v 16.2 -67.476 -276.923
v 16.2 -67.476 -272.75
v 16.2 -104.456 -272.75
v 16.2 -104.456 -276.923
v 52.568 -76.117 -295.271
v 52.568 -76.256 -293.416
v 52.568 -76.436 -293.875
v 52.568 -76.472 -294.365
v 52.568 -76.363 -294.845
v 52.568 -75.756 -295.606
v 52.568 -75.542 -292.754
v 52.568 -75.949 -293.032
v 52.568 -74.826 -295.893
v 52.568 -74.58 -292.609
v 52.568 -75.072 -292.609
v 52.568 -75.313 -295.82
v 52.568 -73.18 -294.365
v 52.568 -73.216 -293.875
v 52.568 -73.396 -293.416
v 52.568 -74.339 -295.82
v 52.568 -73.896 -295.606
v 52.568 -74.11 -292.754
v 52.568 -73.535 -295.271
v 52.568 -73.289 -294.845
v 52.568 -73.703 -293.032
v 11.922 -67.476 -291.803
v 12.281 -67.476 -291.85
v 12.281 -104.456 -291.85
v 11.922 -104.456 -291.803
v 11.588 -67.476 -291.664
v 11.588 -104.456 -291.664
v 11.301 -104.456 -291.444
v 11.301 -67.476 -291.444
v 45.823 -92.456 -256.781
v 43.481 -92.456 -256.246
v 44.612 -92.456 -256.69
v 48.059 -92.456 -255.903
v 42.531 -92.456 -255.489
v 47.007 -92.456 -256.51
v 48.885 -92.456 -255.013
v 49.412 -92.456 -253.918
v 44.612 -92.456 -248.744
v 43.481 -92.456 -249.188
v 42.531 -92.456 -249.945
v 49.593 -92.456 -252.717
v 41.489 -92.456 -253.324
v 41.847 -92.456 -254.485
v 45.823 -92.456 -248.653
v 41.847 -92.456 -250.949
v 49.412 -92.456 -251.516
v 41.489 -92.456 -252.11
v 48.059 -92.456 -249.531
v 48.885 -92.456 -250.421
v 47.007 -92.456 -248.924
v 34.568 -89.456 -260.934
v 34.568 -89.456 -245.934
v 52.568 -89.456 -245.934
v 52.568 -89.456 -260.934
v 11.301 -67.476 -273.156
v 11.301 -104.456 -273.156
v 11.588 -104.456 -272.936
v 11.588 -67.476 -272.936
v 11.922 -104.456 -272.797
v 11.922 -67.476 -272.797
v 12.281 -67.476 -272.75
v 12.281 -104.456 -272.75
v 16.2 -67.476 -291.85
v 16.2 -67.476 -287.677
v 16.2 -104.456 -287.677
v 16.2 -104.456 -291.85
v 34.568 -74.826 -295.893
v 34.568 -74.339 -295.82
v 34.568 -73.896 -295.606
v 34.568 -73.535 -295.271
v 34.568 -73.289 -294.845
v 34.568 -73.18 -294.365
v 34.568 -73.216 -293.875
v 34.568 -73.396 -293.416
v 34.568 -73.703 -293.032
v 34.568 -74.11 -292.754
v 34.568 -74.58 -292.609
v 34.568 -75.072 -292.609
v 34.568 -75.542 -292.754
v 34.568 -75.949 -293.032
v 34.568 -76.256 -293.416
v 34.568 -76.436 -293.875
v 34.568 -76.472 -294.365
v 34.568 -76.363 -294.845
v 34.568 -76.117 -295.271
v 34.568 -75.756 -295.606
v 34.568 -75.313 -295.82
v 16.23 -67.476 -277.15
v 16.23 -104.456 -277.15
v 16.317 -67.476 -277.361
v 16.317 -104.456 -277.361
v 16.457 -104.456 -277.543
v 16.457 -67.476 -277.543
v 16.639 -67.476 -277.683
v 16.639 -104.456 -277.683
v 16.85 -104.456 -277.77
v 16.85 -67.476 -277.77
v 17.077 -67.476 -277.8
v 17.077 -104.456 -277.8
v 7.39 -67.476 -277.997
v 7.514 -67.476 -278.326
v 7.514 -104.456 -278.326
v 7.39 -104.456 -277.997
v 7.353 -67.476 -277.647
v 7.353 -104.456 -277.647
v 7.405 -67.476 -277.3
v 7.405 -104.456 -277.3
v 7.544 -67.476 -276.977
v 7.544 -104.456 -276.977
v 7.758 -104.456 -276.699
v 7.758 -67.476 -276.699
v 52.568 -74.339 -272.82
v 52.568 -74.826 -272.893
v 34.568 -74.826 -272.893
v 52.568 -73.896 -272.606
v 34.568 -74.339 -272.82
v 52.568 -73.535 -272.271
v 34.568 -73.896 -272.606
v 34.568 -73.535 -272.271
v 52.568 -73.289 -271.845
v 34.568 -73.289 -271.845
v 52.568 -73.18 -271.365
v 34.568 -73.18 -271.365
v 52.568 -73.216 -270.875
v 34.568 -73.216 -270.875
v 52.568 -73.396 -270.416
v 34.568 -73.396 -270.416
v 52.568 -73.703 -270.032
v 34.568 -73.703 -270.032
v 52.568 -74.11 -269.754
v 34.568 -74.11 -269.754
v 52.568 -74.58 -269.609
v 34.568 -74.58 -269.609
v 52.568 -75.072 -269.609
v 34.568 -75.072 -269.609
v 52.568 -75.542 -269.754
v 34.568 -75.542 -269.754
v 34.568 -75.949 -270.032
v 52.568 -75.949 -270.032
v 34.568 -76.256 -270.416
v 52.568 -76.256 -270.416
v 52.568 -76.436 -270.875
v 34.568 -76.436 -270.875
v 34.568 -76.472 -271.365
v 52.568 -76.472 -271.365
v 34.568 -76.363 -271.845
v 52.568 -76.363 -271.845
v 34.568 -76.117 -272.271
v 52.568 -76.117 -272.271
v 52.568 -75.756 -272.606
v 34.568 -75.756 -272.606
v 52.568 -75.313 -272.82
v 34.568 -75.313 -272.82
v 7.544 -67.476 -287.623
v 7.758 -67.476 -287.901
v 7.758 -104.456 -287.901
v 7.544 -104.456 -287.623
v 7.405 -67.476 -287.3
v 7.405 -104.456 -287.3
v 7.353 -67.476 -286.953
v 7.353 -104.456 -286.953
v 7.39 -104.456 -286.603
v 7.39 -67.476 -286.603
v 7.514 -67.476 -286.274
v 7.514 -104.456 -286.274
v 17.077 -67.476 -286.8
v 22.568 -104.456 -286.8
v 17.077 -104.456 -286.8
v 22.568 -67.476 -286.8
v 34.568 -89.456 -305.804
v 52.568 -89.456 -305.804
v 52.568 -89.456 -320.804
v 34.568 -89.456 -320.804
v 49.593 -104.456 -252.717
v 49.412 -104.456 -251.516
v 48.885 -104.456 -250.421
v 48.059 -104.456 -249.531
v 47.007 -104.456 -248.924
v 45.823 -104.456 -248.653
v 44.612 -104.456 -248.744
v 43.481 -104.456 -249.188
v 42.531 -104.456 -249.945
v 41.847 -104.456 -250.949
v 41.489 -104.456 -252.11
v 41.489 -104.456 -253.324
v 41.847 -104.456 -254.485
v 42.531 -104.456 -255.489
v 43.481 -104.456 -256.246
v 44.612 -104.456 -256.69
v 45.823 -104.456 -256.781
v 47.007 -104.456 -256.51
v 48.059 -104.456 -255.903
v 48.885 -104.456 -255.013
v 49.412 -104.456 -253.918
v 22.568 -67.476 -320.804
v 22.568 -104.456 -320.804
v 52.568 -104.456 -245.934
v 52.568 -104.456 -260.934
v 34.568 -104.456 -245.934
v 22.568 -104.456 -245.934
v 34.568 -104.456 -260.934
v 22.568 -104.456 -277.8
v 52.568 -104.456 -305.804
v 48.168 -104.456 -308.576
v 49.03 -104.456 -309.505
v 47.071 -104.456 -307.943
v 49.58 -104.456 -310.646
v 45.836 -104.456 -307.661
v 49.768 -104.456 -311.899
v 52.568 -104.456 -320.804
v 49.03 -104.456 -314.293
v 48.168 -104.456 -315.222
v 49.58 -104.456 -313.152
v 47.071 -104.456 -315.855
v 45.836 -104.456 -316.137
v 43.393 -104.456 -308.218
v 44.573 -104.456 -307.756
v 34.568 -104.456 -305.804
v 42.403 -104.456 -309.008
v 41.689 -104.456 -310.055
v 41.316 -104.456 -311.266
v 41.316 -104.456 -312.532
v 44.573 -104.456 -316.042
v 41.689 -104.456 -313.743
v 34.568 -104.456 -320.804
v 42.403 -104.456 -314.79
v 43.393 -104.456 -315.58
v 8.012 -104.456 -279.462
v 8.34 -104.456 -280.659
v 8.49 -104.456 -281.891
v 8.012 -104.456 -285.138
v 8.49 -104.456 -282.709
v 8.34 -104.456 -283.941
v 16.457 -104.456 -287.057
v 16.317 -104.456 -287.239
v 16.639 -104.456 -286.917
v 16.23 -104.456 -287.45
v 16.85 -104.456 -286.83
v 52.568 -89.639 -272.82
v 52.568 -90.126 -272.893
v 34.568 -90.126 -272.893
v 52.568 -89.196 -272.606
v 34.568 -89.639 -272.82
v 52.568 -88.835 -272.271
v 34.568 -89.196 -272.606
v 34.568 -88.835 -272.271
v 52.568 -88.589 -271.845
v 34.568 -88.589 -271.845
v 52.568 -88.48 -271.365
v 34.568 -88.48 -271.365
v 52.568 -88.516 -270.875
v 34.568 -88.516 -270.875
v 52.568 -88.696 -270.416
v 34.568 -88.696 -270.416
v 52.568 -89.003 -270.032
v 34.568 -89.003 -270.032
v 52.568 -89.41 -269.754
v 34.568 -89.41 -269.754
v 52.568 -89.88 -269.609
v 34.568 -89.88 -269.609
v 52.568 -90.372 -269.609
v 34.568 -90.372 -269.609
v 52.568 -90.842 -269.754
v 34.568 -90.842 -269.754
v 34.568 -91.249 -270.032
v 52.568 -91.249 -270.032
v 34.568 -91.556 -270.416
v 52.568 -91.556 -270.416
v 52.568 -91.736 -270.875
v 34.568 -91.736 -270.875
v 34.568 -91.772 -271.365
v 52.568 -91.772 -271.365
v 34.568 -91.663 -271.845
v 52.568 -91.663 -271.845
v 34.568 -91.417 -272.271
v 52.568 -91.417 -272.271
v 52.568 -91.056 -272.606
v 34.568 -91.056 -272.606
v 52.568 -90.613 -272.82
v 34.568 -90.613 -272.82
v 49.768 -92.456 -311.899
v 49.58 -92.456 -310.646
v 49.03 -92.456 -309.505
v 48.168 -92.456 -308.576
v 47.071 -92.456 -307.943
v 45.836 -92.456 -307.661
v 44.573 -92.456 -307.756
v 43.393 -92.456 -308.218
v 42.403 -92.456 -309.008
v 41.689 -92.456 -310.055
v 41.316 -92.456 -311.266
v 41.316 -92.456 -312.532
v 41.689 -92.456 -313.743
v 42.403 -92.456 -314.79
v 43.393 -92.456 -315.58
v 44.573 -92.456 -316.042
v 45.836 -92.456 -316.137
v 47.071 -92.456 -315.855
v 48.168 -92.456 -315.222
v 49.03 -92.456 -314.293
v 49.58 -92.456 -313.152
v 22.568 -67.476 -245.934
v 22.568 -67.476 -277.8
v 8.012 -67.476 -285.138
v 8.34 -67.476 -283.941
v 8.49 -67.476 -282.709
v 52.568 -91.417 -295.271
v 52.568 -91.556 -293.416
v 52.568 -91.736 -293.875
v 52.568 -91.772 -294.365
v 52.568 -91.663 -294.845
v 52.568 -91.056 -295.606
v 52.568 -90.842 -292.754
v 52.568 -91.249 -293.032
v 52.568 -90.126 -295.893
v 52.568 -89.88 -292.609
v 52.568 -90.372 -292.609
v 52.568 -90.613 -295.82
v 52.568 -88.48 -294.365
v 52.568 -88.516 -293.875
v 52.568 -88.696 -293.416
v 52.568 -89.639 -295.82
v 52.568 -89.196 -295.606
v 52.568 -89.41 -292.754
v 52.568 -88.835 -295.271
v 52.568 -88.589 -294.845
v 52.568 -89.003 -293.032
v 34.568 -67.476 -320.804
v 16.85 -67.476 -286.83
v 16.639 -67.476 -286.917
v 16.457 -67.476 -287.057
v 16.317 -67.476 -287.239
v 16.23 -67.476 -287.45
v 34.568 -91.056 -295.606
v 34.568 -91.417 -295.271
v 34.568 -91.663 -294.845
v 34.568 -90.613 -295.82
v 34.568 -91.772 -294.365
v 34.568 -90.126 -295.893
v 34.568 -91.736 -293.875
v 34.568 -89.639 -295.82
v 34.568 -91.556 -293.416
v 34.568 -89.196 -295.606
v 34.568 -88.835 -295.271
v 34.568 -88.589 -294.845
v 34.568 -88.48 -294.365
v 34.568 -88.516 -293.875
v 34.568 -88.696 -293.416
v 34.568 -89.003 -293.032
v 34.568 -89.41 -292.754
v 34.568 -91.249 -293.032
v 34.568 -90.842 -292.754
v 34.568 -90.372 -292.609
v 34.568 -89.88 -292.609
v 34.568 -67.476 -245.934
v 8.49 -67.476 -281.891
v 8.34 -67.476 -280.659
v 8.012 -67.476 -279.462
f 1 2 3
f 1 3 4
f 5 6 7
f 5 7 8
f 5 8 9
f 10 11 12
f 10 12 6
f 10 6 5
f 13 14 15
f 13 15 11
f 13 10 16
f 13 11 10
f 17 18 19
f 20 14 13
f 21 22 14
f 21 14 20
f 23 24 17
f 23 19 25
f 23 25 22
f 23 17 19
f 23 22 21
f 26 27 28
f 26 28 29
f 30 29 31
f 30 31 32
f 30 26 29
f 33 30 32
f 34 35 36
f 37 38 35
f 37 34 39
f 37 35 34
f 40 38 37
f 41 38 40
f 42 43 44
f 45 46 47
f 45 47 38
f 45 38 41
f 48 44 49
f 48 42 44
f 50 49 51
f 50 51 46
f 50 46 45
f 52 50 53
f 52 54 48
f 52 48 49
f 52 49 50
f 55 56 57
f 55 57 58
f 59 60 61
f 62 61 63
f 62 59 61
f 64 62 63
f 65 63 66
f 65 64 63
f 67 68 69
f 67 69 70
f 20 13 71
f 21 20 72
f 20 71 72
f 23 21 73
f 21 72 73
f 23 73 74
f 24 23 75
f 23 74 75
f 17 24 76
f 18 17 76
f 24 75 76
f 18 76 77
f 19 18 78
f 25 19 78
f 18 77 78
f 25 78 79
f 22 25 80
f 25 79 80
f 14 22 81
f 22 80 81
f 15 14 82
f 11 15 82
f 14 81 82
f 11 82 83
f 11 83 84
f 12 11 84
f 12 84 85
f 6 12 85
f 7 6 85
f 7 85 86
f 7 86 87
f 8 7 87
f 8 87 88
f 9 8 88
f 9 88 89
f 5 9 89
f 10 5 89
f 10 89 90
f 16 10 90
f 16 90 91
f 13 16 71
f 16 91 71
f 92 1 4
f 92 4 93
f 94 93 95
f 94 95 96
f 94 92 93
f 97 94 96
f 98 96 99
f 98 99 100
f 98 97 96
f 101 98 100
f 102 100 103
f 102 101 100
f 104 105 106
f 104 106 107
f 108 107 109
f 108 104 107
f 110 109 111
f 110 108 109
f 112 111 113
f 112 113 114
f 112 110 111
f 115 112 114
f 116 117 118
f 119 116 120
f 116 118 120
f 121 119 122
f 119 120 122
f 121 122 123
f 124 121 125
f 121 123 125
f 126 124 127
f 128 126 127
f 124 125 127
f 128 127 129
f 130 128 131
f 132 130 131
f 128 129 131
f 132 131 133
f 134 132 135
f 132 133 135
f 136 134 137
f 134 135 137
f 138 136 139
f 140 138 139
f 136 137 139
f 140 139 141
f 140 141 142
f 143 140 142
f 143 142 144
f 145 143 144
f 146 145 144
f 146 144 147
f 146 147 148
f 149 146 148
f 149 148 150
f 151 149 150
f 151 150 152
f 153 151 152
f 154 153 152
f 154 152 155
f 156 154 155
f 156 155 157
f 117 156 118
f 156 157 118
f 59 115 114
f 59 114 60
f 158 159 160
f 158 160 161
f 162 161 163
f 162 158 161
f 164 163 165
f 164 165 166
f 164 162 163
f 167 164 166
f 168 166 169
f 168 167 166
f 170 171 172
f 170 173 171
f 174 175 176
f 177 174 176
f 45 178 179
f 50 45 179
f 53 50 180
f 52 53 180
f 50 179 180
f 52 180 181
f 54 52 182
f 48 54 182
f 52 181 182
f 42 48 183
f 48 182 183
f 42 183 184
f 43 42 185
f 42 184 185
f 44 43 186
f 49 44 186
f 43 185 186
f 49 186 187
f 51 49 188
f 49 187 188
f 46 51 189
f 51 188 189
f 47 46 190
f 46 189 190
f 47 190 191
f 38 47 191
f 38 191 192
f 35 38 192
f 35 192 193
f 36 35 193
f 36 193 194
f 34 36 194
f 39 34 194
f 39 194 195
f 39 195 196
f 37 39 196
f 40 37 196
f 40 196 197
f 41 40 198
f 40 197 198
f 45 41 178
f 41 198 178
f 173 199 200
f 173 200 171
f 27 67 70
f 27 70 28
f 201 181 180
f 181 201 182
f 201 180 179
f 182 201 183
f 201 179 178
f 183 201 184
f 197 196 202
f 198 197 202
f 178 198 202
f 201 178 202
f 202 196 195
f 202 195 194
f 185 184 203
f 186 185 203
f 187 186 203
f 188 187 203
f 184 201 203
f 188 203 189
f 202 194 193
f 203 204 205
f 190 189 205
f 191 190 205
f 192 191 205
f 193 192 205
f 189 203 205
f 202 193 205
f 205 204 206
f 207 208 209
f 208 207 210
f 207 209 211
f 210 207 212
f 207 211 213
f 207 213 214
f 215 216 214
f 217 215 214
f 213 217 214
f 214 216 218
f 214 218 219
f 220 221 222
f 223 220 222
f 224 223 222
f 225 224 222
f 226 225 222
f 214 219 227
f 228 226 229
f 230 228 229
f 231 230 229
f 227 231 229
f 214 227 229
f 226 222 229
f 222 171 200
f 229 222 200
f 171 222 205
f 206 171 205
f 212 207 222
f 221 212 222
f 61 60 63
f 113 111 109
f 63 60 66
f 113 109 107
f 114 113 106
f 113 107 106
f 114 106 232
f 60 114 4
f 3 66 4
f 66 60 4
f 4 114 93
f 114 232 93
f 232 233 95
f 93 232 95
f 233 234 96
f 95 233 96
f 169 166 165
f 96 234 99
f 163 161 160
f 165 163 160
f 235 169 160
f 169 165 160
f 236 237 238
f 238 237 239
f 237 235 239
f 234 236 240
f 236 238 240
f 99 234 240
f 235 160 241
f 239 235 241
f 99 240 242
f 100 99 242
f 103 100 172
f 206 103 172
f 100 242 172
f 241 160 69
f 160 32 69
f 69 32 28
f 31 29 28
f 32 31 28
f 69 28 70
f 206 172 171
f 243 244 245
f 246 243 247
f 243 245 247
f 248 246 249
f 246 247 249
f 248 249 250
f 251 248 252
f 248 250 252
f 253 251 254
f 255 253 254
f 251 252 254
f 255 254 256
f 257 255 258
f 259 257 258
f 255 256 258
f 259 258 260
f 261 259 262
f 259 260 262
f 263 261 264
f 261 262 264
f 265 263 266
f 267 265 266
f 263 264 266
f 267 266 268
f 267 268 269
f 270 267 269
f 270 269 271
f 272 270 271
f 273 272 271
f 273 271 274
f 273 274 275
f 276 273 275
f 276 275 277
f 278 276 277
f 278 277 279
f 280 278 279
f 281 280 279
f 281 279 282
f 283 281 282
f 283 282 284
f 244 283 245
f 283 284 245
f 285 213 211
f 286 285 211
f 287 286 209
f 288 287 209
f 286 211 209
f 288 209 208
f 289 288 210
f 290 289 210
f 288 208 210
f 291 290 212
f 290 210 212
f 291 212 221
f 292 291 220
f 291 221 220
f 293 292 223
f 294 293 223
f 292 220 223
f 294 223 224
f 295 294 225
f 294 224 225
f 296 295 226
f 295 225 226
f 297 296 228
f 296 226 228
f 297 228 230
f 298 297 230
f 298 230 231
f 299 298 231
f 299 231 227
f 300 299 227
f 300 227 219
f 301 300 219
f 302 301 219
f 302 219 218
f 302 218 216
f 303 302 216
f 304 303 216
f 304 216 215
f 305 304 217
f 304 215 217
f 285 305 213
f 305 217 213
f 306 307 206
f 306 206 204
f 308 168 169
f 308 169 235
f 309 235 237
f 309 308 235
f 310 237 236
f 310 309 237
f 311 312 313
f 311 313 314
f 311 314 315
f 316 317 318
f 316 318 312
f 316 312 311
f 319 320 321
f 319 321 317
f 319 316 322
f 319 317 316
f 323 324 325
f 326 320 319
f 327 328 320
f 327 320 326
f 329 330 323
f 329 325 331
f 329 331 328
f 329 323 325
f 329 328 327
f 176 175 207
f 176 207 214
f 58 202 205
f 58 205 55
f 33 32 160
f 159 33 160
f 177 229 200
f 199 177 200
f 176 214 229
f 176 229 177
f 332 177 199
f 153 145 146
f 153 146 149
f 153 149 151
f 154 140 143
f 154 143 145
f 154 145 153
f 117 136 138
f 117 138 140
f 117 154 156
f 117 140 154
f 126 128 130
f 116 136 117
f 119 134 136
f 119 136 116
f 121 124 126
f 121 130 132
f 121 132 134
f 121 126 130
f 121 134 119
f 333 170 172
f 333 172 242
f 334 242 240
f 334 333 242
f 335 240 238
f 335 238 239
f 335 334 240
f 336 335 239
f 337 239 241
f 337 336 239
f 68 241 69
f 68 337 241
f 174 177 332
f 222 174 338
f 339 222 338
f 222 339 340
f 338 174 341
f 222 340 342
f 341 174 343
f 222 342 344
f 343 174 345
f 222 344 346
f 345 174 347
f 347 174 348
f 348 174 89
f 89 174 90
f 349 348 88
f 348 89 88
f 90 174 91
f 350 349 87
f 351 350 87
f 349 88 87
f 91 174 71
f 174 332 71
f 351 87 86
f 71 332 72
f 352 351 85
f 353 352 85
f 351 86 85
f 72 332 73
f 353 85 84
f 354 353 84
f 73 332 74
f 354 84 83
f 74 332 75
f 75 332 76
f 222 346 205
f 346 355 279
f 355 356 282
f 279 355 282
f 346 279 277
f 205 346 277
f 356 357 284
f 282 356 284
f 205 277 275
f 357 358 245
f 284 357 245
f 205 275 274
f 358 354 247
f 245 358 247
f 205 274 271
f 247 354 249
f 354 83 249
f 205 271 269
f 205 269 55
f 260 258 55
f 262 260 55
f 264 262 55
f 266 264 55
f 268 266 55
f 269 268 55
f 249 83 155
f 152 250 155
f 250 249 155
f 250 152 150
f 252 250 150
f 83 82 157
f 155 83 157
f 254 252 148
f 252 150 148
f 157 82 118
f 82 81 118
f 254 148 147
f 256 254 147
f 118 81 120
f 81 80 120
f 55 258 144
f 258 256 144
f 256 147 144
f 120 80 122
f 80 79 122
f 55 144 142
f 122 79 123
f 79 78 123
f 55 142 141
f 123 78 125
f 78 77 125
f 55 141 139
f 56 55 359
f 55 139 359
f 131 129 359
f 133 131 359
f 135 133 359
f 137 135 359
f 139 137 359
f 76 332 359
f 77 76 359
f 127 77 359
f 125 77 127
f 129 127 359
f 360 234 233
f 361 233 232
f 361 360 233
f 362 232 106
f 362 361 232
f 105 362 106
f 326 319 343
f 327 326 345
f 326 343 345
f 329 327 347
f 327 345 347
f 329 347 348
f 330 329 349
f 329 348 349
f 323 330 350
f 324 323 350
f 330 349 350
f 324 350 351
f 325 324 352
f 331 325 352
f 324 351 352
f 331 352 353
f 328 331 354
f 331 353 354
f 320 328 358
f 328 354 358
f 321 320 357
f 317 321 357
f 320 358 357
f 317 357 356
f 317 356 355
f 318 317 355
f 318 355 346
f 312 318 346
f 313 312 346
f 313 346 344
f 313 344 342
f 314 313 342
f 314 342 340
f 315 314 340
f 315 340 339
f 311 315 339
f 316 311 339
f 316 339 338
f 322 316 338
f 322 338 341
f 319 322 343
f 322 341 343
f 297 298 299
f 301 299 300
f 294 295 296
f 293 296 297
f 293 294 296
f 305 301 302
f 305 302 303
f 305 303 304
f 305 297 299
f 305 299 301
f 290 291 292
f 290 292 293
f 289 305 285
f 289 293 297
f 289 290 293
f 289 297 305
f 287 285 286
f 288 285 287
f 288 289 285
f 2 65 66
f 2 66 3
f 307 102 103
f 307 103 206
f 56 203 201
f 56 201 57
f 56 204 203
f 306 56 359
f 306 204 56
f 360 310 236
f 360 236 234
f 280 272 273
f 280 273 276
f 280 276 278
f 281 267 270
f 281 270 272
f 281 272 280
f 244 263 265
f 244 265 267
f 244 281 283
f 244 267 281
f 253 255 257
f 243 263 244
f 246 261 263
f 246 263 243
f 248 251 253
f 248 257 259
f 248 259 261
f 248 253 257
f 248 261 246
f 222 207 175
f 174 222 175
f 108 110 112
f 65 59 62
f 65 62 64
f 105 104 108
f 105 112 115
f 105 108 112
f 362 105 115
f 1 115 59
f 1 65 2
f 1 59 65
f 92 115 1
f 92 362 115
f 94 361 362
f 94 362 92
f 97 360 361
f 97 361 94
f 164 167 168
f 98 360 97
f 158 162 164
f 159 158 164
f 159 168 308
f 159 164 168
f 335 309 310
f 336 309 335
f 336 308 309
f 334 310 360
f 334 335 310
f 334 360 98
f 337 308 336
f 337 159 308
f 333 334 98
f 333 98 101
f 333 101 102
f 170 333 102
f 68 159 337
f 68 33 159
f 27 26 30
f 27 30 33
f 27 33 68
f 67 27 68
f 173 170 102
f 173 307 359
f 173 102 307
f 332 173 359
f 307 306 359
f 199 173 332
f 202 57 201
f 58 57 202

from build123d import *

# Parameters (mm, degrees)
SKETCH1_W           = 74.870479659
SKETCH1_H           = 36.98000569
BOSS_EXTRUDE1_DEPTH = 12
SKETCH3_R           = 1.651
BOSS_EXTRUDE2_DEPTH = 18
SKETCH4_W           = 15
SKETCH4_H           = 15
BOSS_EXTRUDE3_DEPTH = 18
SKETCH5_R           = 4.075
SKETCH5_R_2         = 4.25
CUT_EXTRUDE1_DEPTH  = 12
BOSS_EXTRUDE4_DEPTH = 36.980006


with BuildPart() as part:
    # Sketch1 → Boss-Extrude1 (new body)
    with BuildSketch(Plane.ZY.offset(-34.568450848)):
        with Locations((-283.368991002, -85.966002845)):
            Rectangle(SKETCH1_W, SKETCH1_H)
    extrude(amount=BOSS_EXTRUDE1_DEPTH)

    # Sketch3 → Boss-Extrude2 (add)
    with BuildSketch(Plane(origin=(34.568450848, 0, 0), x_dir=(0, 0, -1), z_dir=(1, 0, 0))):
        with Locations((271.241893694, -74.826)):
            Circle(SKETCH3_R)
        with Locations((271.241893694, -90.126)):
            Circle(SKETCH3_R)
        with Locations((294.241893694, -74.826)):
            Circle(SKETCH3_R)
        with Locations((294.241893694, -90.126)):
            Circle(SKETCH3_R)
    extrude(amount=BOSS_EXTRUDE2_DEPTH)

    # Sketch4 → Boss-Extrude3 (add)
    with BuildSketch(Plane(origin=(34.568450848, 0, 0), x_dir=(0, 0, -1), z_dir=(1, 0, 0))):
        with Locations((253.433751172, -96.95600569)):
            Rectangle(SKETCH4_W, SKETCH4_H)
        with Locations((313.304230831, -96.95600569)):
            Rectangle(SKETCH4_W, SKETCH4_H)
    extrude(amount=BOSS_EXTRUDE3_DEPTH)

    # Sketch5 → Cut-Extrude1 (cut)
    with BuildSketch(Plane.XZ.offset(104.45600569)):
        with Locations((45.518450848, -252.717)):
            Circle(SKETCH5_R)
        with Locations((45.518450848, -311.899)):
            Circle(SKETCH5_R_2)
    extrude(amount=-CUT_EXTRUDE1_DEPTH, mode=Mode.SUBTRACT)

    # Sketch7 → Boss-Extrude4 (add)
    with BuildSketch(Plane(origin=(0, -67.476, 0), x_dir=(1, 0, 0), z_dir=(0, 1, 0))):
        with BuildLine():
            Line((8.49017791, 282.708508335), (8.49017791, 281.891491665))
            ThreePointArc((8.49017791, 281.891491665), (8.198108508, 280.0547791), (7.513571814, 278.325551788))
            ThreePointArc((7.513571814, 278.325551788), (7.368274769, 277.471769831), (7.758499153, 276.698607628))
            Line((7.758499153, 276.698607628), (11.301449673, 273.155657108))
            ThreePointArc((11.301449673, 273.155657108), (11.750776011, 272.855426847), (12.280792565, 272.75))
            Line((12.280792565, 272.75), (16.2, 272.75))
            Line((16.2, 272.75), (16.2, 276.923))
            ThreePointArc((16.2, 276.923), (16.456867353, 277.543132647), (17.077, 277.8))
            Line((17.077, 277.8), (20.8615, 277.8))
            Line((20.8615, 277.8), (22.568450848, 277.8))
            Line((22.568450848, 277.8), (22.568450848, 286.8))
            Line((22.568450848, 286.8), (20.8615, 286.8))
            Line((20.8615, 286.8), (17.077, 286.8))
            ThreePointArc((17.077, 286.8), (16.456867353, 287.056867353), (16.2, 287.677))
            Line((16.2, 287.677), (16.2, 291.85))
            Line((16.2, 291.85), (12.280792565, 291.85))
            ThreePointArc((12.280792565, 291.85), (11.750776011, 291.744573153), (11.301449673, 291.444342892))
            Line((11.301449673, 291.444342892), (7.758499153, 287.901392372))
            ThreePointArc((7.758499153, 287.901392372), (7.368274769, 287.128230169), (7.513571814, 286.274448212))
            ThreePointArc((7.513571814, 286.274448212), (8.198108508, 284.5452209), (8.49017791, 282.708508335))
        make_face()
    extrude(amount=-BOSS_EXTRUDE4_DEPTH)


solid = part.part
